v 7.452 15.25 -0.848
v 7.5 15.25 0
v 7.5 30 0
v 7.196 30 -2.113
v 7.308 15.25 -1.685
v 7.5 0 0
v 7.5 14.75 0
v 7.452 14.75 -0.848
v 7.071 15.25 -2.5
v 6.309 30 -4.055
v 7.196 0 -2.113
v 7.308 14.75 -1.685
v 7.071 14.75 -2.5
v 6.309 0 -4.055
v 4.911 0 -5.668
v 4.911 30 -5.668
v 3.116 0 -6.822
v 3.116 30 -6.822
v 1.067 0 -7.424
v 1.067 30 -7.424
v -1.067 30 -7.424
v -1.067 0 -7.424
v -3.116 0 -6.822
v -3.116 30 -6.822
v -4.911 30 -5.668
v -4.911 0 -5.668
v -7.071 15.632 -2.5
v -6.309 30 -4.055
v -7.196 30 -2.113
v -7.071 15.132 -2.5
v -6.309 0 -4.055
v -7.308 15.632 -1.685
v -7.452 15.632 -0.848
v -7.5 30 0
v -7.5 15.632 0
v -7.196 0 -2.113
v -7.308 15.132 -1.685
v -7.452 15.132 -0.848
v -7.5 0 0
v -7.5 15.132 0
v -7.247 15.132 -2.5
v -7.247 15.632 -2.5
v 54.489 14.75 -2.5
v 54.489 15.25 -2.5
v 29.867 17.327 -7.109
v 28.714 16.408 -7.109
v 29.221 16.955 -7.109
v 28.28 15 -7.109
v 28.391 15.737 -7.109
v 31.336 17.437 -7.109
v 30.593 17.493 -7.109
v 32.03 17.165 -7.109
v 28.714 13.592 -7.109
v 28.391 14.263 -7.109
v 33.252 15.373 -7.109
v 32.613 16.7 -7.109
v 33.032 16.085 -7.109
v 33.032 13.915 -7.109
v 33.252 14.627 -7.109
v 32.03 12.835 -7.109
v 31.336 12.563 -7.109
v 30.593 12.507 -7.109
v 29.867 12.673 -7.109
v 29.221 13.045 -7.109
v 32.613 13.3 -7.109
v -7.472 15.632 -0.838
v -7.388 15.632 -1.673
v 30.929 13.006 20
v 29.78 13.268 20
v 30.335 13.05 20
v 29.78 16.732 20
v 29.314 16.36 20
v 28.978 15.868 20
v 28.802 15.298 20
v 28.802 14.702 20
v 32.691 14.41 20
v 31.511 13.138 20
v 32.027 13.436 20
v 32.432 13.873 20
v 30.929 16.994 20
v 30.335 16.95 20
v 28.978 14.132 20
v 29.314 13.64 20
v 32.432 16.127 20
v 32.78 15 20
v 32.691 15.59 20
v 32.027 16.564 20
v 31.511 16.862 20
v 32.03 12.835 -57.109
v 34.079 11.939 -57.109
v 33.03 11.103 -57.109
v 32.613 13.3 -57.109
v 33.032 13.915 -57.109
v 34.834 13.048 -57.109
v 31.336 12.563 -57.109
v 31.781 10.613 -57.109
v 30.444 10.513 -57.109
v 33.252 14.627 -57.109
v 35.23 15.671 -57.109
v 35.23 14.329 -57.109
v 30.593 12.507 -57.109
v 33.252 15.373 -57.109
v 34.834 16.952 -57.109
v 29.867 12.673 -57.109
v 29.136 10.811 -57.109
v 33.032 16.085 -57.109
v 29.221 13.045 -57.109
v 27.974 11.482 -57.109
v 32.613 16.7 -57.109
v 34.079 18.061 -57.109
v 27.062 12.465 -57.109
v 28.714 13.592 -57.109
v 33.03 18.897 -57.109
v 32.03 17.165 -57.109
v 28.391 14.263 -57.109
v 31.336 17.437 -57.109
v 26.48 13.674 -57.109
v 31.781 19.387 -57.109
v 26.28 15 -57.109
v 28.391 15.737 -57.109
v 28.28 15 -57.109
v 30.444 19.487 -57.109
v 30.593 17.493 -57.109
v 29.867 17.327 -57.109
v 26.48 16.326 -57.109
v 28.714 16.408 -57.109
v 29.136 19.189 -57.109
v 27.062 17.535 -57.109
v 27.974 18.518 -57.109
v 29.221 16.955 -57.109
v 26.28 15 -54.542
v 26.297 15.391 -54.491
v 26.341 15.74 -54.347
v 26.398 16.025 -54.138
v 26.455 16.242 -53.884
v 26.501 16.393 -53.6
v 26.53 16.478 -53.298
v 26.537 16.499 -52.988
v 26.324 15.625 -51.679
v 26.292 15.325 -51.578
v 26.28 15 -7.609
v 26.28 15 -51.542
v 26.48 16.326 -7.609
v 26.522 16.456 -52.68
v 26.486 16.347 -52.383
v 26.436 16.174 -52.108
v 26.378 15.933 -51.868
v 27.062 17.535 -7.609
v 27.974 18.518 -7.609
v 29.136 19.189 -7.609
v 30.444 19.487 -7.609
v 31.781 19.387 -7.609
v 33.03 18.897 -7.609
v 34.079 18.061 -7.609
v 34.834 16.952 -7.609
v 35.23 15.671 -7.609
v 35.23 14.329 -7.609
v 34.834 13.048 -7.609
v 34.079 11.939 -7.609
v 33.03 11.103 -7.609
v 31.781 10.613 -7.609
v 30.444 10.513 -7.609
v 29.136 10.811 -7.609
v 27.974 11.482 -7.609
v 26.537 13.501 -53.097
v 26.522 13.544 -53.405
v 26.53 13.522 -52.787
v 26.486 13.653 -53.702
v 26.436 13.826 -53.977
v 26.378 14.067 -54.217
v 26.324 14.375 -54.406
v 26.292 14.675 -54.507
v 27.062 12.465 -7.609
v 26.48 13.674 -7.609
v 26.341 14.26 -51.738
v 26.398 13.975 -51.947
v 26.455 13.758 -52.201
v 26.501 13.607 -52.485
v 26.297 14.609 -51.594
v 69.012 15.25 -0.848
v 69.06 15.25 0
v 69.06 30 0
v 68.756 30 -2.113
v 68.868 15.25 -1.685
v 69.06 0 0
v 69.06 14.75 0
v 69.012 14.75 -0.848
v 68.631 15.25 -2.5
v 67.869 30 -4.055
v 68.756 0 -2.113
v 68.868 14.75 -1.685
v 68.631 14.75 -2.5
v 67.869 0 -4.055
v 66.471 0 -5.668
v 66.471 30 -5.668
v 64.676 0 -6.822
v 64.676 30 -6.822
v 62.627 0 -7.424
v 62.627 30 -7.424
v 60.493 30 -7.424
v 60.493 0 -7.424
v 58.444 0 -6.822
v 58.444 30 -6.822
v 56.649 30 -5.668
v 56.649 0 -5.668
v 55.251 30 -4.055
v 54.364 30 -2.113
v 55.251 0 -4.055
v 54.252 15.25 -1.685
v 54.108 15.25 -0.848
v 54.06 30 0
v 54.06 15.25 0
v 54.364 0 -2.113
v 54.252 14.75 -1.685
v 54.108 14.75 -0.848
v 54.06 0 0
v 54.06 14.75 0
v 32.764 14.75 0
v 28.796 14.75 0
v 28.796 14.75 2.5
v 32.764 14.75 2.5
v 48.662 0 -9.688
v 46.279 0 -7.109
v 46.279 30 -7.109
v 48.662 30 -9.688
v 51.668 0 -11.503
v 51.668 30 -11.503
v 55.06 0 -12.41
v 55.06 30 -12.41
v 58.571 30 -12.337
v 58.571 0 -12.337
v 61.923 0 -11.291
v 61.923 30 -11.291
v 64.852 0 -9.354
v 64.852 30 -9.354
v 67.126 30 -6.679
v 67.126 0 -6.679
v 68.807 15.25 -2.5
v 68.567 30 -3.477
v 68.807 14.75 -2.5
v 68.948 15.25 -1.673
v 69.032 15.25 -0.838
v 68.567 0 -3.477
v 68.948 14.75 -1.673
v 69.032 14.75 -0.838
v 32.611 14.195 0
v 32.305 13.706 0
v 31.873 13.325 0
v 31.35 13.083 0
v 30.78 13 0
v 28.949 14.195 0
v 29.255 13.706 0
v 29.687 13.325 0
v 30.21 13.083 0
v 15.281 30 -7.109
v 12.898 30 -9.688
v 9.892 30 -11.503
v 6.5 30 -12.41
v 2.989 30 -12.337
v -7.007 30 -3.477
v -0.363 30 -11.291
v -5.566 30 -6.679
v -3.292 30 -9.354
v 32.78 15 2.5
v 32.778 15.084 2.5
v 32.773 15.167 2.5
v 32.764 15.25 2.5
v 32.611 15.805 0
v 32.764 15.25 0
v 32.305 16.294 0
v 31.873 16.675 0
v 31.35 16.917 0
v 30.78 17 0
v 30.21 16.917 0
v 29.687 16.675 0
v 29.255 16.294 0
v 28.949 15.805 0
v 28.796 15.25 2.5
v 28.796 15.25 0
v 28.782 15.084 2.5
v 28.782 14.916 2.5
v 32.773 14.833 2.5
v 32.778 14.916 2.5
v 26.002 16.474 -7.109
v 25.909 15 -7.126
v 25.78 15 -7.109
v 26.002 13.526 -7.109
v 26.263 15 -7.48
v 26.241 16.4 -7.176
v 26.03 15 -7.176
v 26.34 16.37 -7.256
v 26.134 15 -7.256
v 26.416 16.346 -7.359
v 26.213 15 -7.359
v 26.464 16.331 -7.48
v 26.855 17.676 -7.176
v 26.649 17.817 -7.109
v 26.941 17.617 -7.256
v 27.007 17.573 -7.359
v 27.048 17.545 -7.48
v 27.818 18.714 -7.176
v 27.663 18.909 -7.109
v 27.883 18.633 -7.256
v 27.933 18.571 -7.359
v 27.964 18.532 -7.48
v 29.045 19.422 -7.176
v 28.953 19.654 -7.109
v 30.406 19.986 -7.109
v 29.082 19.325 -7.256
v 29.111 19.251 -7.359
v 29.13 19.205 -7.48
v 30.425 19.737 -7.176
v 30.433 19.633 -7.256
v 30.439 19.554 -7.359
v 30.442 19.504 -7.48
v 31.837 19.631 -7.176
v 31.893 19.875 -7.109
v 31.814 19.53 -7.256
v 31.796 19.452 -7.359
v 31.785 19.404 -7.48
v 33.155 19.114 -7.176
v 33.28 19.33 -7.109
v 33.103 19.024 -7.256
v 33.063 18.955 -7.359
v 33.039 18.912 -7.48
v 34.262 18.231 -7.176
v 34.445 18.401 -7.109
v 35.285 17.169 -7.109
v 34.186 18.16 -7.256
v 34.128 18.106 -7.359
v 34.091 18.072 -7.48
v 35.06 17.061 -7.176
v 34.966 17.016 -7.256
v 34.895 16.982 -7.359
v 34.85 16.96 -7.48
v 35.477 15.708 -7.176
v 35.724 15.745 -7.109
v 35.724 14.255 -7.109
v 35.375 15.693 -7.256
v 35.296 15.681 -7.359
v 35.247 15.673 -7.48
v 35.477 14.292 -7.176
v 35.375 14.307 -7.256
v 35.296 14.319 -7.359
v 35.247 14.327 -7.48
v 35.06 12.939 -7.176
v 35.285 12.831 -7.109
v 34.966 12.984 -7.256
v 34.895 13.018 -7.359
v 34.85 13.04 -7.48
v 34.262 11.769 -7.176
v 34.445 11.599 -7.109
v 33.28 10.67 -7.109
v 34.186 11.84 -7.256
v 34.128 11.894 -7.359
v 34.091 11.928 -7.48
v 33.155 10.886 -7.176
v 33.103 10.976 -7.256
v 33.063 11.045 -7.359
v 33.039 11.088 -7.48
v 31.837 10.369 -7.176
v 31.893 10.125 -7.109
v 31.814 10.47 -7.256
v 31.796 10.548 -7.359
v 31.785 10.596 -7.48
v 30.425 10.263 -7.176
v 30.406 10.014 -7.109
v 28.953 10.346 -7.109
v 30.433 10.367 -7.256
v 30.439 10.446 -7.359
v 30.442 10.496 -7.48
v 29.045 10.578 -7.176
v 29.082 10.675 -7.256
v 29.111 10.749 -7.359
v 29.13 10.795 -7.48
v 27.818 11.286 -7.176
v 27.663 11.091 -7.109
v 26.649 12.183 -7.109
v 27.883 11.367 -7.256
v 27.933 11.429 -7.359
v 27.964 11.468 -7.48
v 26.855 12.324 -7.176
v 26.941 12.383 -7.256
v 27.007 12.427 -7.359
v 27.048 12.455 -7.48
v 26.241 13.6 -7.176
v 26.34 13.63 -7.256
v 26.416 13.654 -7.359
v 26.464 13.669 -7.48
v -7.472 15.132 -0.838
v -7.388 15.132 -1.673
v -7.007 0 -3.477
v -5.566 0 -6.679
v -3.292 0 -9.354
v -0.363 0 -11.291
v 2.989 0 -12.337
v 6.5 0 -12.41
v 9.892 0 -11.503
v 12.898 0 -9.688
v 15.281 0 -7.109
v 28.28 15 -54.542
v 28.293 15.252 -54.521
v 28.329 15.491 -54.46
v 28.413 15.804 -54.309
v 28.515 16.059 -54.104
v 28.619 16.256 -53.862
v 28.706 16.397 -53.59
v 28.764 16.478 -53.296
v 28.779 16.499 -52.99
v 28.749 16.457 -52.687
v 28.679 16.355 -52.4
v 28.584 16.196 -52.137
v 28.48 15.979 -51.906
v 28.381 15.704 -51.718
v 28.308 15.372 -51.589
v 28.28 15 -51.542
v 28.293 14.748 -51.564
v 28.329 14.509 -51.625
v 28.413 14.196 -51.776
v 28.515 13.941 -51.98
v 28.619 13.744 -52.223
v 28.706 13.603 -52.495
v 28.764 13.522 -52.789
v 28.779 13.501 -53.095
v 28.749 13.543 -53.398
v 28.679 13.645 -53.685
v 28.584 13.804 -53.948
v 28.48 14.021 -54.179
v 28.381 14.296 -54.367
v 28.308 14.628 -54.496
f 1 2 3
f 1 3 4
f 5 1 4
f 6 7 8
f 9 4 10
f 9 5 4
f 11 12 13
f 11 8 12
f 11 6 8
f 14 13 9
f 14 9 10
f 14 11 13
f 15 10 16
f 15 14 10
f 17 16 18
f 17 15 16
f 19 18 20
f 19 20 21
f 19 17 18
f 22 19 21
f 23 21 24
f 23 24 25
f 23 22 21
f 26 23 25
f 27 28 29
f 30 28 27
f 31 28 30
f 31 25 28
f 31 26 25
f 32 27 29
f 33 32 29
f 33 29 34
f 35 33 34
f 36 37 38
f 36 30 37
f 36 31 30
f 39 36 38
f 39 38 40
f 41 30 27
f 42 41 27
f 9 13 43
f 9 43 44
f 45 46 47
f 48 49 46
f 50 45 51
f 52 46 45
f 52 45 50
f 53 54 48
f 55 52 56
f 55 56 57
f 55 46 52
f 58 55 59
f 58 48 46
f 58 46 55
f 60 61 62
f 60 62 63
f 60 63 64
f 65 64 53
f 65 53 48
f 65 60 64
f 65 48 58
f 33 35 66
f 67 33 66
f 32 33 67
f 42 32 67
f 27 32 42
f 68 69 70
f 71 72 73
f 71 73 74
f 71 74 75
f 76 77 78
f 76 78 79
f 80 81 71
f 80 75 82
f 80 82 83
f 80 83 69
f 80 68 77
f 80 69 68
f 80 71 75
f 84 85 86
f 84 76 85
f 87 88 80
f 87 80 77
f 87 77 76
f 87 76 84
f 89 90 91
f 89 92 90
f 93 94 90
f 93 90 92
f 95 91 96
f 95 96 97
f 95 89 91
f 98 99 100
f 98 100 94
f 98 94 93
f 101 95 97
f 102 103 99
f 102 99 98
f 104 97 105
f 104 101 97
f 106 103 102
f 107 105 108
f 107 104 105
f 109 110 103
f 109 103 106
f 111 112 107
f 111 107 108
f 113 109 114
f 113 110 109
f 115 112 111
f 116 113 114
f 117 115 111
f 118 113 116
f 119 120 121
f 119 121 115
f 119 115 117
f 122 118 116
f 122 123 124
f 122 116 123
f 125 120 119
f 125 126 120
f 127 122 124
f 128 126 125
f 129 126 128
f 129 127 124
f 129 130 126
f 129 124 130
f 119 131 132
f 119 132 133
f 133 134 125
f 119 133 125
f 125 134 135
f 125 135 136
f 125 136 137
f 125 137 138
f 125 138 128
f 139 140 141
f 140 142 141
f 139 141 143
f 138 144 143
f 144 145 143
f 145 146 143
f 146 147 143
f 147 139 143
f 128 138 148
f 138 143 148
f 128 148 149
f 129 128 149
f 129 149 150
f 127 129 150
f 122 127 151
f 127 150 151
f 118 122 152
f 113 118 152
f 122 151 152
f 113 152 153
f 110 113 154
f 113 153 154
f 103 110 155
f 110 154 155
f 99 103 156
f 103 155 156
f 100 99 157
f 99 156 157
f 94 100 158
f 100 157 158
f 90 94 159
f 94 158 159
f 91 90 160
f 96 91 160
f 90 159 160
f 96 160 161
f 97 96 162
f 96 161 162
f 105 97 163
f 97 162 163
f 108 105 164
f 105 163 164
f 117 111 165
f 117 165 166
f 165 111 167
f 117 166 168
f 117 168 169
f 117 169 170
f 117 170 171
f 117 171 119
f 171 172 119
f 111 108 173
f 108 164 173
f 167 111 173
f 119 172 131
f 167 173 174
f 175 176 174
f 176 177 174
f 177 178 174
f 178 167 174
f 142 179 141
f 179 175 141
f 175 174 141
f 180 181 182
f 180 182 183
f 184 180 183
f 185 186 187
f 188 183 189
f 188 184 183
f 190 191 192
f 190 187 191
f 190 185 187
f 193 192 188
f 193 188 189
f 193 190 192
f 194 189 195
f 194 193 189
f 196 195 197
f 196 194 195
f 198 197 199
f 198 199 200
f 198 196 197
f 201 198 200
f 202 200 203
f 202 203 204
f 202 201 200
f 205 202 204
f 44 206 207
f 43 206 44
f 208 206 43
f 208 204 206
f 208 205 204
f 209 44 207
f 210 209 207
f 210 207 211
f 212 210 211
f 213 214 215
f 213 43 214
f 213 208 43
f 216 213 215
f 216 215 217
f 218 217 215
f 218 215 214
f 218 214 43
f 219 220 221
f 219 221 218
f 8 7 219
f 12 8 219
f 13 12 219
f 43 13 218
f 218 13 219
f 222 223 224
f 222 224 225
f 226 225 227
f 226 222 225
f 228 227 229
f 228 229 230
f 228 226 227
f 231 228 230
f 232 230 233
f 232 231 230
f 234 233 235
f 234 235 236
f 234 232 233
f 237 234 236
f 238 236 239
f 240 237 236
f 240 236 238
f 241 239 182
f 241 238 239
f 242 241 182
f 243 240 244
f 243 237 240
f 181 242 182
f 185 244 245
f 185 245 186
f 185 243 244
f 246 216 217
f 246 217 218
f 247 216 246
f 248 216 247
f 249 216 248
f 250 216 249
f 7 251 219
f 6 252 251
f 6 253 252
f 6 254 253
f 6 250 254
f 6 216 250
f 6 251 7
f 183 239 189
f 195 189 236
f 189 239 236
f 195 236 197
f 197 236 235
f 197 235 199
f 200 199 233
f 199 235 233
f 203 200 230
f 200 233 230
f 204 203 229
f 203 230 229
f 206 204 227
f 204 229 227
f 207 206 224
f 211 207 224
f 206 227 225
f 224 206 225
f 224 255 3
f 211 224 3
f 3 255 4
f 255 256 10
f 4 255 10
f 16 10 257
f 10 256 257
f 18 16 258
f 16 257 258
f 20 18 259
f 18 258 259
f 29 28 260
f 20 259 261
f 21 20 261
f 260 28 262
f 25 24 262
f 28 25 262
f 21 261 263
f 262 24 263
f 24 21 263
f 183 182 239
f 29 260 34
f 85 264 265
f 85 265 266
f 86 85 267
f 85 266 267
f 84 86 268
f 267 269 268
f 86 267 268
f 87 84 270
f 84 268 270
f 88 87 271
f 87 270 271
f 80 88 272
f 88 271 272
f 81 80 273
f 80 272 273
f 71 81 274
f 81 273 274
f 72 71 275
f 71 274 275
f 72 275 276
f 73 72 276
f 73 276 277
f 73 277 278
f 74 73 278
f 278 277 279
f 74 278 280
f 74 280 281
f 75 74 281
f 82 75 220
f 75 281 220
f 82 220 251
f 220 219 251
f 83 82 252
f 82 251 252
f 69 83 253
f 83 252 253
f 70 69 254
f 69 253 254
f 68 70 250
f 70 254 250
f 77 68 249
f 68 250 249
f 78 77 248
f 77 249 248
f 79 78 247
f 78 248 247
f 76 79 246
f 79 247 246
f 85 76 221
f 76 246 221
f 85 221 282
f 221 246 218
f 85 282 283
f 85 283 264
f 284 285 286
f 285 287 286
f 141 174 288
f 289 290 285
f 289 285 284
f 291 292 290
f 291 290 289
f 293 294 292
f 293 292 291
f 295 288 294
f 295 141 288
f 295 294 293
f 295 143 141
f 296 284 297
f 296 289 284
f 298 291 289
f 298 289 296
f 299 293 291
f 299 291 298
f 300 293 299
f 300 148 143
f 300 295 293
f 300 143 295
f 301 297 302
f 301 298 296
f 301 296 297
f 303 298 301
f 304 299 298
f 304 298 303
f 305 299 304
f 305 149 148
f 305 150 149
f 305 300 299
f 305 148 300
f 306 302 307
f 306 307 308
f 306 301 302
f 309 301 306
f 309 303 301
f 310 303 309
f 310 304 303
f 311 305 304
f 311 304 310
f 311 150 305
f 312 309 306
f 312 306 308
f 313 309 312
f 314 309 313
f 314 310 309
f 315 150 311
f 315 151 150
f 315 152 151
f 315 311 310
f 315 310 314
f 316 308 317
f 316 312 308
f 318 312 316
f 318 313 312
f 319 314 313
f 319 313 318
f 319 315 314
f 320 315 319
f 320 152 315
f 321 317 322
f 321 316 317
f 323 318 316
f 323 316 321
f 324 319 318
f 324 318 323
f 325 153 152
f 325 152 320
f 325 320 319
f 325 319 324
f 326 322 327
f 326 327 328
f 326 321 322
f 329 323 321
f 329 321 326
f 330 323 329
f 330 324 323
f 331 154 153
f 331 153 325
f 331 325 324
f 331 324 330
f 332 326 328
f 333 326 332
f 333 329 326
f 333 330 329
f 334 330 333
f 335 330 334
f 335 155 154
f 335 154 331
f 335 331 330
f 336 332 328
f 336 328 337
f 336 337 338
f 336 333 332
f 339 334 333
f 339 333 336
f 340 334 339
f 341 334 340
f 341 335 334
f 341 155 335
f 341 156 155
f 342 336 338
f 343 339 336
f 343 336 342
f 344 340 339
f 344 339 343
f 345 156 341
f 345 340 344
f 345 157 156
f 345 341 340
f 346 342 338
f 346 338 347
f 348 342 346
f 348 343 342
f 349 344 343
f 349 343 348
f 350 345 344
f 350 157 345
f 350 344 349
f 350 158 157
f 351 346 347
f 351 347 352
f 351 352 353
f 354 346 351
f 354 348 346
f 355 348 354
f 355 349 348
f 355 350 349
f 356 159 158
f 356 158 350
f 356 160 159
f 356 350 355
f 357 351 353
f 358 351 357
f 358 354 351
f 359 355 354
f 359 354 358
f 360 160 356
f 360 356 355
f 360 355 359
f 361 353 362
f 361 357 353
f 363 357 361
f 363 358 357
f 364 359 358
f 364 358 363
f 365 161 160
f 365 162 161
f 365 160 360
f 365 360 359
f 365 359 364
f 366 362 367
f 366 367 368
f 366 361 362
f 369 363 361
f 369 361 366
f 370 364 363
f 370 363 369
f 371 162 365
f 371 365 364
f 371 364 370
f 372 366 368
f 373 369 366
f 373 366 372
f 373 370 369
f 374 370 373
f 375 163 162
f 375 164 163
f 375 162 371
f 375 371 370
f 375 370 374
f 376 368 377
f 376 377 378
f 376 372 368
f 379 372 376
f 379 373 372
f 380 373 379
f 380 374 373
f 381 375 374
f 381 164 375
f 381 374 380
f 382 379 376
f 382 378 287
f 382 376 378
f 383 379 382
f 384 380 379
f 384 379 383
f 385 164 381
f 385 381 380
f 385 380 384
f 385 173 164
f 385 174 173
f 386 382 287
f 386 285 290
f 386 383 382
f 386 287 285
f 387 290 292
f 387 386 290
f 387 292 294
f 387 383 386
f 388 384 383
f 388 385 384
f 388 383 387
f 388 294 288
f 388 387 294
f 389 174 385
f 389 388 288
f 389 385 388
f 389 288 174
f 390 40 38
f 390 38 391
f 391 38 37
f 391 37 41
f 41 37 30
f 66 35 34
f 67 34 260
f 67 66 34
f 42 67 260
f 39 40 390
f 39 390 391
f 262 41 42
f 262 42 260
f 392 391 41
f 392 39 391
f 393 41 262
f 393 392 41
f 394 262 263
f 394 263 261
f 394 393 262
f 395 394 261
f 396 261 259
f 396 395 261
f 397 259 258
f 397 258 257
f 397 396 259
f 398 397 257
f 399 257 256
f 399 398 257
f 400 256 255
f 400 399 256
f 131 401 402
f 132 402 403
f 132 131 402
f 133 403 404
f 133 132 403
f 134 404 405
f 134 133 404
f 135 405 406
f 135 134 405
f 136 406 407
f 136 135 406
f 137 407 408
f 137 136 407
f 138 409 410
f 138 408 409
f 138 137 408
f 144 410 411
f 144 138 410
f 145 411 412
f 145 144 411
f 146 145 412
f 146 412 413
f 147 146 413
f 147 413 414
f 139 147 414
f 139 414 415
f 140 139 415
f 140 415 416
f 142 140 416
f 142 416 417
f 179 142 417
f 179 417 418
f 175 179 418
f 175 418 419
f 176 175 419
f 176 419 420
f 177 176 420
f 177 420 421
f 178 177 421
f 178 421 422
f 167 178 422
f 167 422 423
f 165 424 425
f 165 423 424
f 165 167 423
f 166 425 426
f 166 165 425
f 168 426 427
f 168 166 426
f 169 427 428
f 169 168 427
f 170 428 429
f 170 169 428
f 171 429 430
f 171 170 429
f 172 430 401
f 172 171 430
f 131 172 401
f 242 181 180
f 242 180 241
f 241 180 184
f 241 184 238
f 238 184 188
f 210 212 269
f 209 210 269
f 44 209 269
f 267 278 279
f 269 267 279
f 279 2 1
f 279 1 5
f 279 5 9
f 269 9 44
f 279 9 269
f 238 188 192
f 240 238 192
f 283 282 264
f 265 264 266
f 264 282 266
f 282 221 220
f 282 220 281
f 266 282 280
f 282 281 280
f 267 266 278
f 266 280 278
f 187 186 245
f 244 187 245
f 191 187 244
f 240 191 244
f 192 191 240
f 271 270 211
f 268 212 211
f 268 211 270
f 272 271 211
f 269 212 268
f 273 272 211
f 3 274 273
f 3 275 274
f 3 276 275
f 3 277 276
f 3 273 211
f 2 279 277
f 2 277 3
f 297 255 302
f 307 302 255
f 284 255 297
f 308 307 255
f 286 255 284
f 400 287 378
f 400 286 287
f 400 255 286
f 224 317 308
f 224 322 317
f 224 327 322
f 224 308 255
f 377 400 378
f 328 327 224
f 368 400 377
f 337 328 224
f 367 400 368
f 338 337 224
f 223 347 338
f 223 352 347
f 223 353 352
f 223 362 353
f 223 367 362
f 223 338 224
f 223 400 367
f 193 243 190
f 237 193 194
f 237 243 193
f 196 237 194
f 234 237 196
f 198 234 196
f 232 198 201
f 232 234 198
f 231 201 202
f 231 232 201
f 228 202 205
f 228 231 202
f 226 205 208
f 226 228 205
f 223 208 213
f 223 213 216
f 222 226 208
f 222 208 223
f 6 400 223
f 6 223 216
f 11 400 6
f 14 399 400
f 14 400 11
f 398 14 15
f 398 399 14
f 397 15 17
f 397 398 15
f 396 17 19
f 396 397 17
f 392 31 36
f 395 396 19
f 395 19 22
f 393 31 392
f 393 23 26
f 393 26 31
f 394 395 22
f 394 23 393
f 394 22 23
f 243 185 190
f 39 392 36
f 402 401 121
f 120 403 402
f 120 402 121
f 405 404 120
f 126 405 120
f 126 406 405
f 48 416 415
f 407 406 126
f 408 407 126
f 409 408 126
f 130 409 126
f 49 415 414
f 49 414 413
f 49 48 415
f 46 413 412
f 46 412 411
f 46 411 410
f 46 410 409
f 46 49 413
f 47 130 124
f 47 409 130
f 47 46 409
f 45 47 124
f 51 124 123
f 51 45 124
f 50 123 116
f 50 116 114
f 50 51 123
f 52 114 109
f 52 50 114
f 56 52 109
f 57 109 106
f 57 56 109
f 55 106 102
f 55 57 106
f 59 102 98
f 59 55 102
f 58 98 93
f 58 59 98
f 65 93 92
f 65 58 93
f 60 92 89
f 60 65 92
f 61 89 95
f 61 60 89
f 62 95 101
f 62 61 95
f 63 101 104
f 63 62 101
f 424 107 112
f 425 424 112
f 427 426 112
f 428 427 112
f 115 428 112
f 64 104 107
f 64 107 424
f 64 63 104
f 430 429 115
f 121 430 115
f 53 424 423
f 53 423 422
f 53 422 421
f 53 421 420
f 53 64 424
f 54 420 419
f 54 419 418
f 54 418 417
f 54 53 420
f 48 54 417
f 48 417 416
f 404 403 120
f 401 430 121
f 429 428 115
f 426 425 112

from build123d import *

# Parameters (mm, degrees)
BOSS_EXTRUDE1_DEPTH      = 30
SKETCH3_R                = 4.5
SKETCH3_R_2              = 2.5
BOSS_EXTRUDE3_DEPTH      = 50
CUT_EXTRUDE2_REACH       = 71.06
SKETCH7_R                = 1.5
SKETCH8_R                = 2
BOSS_EXTRUDE6_DEPTH      = 20
SKETCH9_W                = 5
SKETCH9_H                = 0.5
CUT_EXTRUDE14_DEPTH      = 15
SKETCH11_W               = 5
SKETCH11_H               = 0.5
CUT_EXTRUDE16_DEPTH      = 1
CUT_EXTRUDE16_DEPTH_BACK = 4
FILLET1_R                = 0.5
SKETCH10_W               = 5
SKETCH10_H               = 0.5
CUT_EXTRUDE15_DEPTH      = 107.779594


with BuildPart() as part:
    # Sketch1 → Boss-Extrude1 (new body)
    with BuildSketch(Plane(origin=(0, 0, 0), x_dir=(1, 0, 0), z_dir=(0, 1, 0))):
        with BuildLine():
            Line((15.281403332, 7.10934213), (46.278596668, 7.10934213))
            ThreePointArc((46.278596668, 7.10934213), (60.283738602, 11.932467089), (69.06, 0))
            ThreePointArc((69.06, 0), (61.56, 7.5), (54.06, 0))
            Line((54.06, 0), (7.5, 0))
            ThreePointArc((7.5, 0), (0, 7.5), (-7.5, 0))
            ThreePointArc((-7.5, 0), (1.276261398, 11.932467089), (15.281403332, 7.10934213))
        make_face()
    extrude(amount=BOSS_EXTRUDE1_DEPTH)

    # Sketch3 → Boss-Extrude3 (add)
    with BuildSketch(Plane(origin=(0, 0, -7.10934213), x_dir=(-1, 0, 0), z_dir=(0, 0, -1))):
        with Locations((-30.78, 15)):
            Circle(SKETCH3_R)
        with Locations((-30.78, 15)):
            Circle(SKETCH3_R_2, mode=Mode.SUBTRACT)
    extrude(amount=BOSS_EXTRUDE3_DEPTH)

    # Sketch7 → Cut-Extrude2 (cut, up to next)
    with BuildSketch(Plane(origin=(0, 0, 0), x_dir=(0, 0, -1), z_dir=(1, 0, 0)), mode=Mode.PRIVATE) as cut_extrude2_sk1:
        with Locations((53.042344304, 15)):
            Circle(SKETCH7_R)
    cut_extrude2_tool1 = extrude(cut_extrude2_sk1.sketch, amount=CUT_EXTRUDE2_REACH, mode=Mode.PRIVATE) & part.part
    add(cut_extrude2_tool1.solids().sort_by_distance((0, 15, -53.042344))[0], mode=Mode.SUBTRACT)

    # Sketch8 → Boss-Extrude6 (add)
    with BuildSketch(Plane.XY):
        with Locations((30.78, 15)):
            Circle(SKETCH8_R)
    extrude(amount=BOSS_EXTRUDE6_DEPTH)

    # Sketch9 → Cut-Extrude14 (cut)
    with BuildSketch(Plane(origin=(0, 0, 0), x_dir=(0, 0, -1), z_dir=(1, 0, 0))):
        with Locations((0, 15.381990369)):
            Rectangle(SKETCH9_W, SKETCH9_H)
    extrude(amount=-CUT_EXTRUDE14_DEPTH, mode=Mode.SUBTRACT)

    # Sketch11 → Cut-Extrude16 (cut, two sides)
    with BuildSketch(Plane(origin=(68.252070678, 0, 0), x_dir=(0, 0, -1), z_dir=(-1, 0, 0))) as cut_extrude16_sk:
        with Locations((0, -15)):
            Rectangle(SKETCH11_W, SKETCH11_H)
    extrude(amount=CUT_EXTRUDE16_DEPTH, mode=Mode.SUBTRACT)
    extrude(cut_extrude16_sk.sketch, amount=-CUT_EXTRUDE16_DEPTH_BACK, mode=Mode.SUBTRACT)

    # Fillet1
    fillet1_edges = [part.edges().sort_by_distance(p)[0] for p in [
        (35.28, 15, -7.10934213),
    ]]
    fillet(fillet1_edges, radius=FILLET1_R)

    # Sketch10 → Cut-Extrude15 (cut)
    with BuildSketch(Plane(origin=(0, 0, 0), x_dir=(0, 0, -1), z_dir=(1, 0, 0))):
        with Locations((0, 15)):
            Rectangle(SKETCH10_W, SKETCH10_H)
    extrude(amount=CUT_EXTRUDE15_DEPTH, mode=Mode.SUBTRACT)


solid = part.part
